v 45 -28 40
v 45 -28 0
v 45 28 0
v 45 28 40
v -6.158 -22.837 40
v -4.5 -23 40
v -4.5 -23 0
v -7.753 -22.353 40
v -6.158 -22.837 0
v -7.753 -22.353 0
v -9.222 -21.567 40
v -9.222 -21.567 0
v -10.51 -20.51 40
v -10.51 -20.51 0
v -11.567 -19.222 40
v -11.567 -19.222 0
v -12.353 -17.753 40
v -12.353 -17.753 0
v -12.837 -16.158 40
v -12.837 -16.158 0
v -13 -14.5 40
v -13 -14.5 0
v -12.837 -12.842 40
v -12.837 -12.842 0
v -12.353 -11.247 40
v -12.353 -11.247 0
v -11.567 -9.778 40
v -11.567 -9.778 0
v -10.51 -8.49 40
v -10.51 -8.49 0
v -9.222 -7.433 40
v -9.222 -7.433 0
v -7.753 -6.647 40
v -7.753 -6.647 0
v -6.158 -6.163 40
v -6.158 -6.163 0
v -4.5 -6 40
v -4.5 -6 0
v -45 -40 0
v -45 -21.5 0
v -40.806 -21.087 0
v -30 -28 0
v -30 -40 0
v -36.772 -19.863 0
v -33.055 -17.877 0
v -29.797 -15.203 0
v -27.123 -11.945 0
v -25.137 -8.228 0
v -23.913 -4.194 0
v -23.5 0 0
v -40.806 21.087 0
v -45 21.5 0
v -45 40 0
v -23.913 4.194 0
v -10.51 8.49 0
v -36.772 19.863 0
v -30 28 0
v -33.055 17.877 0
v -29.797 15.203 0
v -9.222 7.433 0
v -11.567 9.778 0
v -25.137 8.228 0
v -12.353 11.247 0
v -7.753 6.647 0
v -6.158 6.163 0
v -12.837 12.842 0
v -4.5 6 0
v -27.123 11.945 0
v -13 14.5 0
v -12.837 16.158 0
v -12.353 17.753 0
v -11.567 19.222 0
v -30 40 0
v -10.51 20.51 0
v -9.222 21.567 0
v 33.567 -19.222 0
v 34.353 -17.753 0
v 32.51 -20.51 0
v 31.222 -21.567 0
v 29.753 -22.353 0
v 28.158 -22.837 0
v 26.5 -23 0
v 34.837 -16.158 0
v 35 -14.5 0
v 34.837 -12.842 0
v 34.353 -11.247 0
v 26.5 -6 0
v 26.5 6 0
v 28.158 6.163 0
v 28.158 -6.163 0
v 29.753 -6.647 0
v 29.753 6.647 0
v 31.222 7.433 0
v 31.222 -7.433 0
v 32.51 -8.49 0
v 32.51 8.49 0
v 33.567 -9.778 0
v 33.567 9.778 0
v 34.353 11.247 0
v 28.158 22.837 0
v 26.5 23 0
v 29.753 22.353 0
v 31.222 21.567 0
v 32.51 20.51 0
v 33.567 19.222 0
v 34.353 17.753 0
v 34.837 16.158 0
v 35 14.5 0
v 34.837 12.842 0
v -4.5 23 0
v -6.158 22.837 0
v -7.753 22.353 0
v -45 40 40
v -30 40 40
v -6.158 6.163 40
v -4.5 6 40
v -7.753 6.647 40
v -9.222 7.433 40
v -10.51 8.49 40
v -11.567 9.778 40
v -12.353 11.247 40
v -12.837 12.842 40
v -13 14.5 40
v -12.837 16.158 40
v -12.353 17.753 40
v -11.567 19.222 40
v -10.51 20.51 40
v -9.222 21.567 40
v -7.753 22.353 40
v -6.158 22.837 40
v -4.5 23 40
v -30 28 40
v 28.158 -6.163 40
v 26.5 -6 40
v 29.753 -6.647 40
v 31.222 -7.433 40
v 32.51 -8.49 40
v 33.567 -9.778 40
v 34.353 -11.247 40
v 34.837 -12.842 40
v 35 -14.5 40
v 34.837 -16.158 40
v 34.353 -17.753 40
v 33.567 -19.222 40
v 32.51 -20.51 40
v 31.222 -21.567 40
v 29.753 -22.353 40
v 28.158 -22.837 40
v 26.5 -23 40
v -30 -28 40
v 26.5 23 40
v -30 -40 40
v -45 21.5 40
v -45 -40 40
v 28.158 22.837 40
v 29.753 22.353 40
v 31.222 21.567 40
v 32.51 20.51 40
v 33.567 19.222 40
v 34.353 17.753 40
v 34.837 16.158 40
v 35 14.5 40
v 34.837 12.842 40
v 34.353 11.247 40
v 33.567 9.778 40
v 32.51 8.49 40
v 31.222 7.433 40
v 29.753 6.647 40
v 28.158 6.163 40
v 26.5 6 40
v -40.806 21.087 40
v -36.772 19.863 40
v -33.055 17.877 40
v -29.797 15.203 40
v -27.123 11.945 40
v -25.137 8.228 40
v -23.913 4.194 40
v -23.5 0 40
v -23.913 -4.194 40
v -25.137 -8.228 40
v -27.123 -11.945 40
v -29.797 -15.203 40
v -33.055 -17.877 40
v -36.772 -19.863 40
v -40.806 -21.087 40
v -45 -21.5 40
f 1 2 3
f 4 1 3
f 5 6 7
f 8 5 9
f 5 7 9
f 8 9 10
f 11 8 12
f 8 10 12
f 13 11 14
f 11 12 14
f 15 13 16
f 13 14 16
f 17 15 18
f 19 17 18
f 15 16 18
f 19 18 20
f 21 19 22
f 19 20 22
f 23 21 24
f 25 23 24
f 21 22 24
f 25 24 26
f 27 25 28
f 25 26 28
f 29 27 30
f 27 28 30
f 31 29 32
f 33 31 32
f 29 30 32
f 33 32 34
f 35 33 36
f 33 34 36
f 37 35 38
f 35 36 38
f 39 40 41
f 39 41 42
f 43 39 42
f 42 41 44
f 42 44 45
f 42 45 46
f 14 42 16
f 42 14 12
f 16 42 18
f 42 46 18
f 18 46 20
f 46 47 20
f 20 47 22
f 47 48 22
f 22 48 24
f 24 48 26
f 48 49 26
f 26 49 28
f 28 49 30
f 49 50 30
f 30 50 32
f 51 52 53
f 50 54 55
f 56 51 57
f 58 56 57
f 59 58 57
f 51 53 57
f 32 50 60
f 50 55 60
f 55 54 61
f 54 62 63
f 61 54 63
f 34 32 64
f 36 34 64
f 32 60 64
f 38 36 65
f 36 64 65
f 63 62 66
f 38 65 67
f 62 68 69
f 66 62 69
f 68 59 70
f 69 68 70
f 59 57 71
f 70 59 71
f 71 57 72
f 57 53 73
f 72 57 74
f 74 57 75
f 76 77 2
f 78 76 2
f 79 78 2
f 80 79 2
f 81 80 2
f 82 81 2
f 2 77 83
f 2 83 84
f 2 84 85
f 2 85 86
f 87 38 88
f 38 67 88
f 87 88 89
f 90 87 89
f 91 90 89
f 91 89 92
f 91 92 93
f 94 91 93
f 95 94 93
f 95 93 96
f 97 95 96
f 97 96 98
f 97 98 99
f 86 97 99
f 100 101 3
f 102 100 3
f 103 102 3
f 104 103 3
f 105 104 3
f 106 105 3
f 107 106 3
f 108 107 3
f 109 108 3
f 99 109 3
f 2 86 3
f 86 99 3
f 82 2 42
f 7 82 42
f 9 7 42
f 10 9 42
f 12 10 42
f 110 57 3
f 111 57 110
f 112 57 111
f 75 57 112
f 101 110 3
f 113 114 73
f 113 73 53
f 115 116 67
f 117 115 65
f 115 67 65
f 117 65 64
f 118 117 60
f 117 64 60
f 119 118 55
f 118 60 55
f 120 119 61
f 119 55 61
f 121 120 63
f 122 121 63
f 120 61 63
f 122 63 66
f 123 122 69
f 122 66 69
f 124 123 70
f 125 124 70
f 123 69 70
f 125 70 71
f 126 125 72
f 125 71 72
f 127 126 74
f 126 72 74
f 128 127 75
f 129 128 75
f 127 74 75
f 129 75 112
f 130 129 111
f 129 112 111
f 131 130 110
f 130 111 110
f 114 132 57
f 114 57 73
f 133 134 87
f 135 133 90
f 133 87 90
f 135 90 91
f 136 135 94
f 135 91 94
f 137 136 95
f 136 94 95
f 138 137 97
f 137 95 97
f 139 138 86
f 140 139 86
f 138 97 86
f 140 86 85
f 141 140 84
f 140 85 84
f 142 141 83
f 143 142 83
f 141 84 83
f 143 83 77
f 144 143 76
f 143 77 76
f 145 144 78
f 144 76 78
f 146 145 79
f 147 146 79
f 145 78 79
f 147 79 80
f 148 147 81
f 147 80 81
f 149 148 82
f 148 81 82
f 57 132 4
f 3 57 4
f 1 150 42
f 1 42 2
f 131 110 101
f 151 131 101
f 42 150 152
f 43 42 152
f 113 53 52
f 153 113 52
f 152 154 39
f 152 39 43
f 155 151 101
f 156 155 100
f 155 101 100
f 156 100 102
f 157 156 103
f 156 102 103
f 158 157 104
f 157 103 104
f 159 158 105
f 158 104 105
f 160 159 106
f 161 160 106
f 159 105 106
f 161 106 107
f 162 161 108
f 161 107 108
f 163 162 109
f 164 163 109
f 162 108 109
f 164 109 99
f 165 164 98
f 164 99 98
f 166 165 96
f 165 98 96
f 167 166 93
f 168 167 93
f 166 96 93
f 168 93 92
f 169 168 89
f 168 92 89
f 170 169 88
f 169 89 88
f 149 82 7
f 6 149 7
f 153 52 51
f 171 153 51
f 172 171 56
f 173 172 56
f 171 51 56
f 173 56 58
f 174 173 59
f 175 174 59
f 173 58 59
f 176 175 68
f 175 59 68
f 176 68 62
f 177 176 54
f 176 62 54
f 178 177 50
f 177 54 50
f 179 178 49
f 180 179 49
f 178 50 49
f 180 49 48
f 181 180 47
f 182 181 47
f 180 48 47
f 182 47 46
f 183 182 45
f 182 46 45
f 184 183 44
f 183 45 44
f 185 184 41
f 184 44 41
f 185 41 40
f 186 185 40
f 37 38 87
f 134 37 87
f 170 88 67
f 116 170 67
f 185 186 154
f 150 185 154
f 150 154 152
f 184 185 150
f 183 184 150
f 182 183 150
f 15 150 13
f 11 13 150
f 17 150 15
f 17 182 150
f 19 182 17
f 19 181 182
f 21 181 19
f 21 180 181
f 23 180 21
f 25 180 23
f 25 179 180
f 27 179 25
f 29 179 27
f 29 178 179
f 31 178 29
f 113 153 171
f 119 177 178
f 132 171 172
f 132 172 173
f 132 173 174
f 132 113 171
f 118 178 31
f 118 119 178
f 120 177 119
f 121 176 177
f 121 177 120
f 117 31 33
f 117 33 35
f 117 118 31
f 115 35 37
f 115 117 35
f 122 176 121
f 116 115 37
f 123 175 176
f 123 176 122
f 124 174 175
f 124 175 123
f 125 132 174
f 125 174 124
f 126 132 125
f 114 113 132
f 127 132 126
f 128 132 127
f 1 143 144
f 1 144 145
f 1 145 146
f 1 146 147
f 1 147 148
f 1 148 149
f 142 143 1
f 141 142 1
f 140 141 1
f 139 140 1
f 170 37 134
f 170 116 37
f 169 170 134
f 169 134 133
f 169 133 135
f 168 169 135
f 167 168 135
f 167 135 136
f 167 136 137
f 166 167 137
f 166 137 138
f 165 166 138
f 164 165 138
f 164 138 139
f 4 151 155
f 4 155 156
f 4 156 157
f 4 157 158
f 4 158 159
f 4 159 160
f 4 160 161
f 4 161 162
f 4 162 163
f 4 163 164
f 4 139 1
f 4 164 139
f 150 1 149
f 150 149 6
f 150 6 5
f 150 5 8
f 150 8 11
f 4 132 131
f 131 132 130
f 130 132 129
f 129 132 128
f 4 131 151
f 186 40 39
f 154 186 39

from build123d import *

# Parameters (mm, degrees)
EXTRUDE_1_DEPTH     = 40
SKETCH_2_W          = 75
SKETCH_2_H          = 12
CUT_EXTRUDE_1_DEPTH = 73.284161474


with BuildPart() as part:
    # Эскиз1 → Бобышка-Вытянуть1 (new body)
    with BuildSketch(Plane.XY):
        with BuildLine():
            Line((45, -40), (45, 40))
            Line((45, 40), (-45, 40))
            Line((-45, 40), (-45, 21.5))
            ThreePointArc((-45, 21.5), (-23.5, 0), (-45, -21.5))
            Line((-45, -21.5), (-45, -40))
            Line((-45, -40), (45, -40))
        make_face()
        with BuildLine():
            ThreePointArc((-4.5, -23), (-13, -14.5), (-4.5, -6))
            Line((-4.5, -6), (26.5, -6))
            ThreePointArc((26.5, -6), (35, -14.5), (26.5, -23))
            Line((26.5, -23), (-4.5, -23))
        make_face(mode=Mode.SUBTRACT)
        with BuildLine():
            Line((26.5, 6), (-4.5, 6))
            ThreePointArc((-4.5, 6), (-13, 14.5), (-4.5, 23))
            Line((-4.5, 23), (26.5, 23))
            ThreePointArc((26.5, 23), (35, 14.5), (26.5, 6))
        make_face(mode=Mode.SUBTRACT)
    extrude(amount=EXTRUDE_1_DEPTH)

    # Эскиз2 → Вырез-Вытянуть1 (cut, through all)
    with BuildSketch(Plane.XY.offset(40)):
        with Locations((7.5, 34)):
            Rectangle(SKETCH_2_W, SKETCH_2_H)
    cut_extrude_1 = extrude(amount=-CUT_EXTRUDE_1_DEPTH, mode=Mode.SUBTRACT)

    # Зеркальное отражение1: Вырез-Вытянуть1 across plane
    add(cut_extrude_1.mirror(Plane.ZX), mode=Mode.SUBTRACT)


solid = part.part
